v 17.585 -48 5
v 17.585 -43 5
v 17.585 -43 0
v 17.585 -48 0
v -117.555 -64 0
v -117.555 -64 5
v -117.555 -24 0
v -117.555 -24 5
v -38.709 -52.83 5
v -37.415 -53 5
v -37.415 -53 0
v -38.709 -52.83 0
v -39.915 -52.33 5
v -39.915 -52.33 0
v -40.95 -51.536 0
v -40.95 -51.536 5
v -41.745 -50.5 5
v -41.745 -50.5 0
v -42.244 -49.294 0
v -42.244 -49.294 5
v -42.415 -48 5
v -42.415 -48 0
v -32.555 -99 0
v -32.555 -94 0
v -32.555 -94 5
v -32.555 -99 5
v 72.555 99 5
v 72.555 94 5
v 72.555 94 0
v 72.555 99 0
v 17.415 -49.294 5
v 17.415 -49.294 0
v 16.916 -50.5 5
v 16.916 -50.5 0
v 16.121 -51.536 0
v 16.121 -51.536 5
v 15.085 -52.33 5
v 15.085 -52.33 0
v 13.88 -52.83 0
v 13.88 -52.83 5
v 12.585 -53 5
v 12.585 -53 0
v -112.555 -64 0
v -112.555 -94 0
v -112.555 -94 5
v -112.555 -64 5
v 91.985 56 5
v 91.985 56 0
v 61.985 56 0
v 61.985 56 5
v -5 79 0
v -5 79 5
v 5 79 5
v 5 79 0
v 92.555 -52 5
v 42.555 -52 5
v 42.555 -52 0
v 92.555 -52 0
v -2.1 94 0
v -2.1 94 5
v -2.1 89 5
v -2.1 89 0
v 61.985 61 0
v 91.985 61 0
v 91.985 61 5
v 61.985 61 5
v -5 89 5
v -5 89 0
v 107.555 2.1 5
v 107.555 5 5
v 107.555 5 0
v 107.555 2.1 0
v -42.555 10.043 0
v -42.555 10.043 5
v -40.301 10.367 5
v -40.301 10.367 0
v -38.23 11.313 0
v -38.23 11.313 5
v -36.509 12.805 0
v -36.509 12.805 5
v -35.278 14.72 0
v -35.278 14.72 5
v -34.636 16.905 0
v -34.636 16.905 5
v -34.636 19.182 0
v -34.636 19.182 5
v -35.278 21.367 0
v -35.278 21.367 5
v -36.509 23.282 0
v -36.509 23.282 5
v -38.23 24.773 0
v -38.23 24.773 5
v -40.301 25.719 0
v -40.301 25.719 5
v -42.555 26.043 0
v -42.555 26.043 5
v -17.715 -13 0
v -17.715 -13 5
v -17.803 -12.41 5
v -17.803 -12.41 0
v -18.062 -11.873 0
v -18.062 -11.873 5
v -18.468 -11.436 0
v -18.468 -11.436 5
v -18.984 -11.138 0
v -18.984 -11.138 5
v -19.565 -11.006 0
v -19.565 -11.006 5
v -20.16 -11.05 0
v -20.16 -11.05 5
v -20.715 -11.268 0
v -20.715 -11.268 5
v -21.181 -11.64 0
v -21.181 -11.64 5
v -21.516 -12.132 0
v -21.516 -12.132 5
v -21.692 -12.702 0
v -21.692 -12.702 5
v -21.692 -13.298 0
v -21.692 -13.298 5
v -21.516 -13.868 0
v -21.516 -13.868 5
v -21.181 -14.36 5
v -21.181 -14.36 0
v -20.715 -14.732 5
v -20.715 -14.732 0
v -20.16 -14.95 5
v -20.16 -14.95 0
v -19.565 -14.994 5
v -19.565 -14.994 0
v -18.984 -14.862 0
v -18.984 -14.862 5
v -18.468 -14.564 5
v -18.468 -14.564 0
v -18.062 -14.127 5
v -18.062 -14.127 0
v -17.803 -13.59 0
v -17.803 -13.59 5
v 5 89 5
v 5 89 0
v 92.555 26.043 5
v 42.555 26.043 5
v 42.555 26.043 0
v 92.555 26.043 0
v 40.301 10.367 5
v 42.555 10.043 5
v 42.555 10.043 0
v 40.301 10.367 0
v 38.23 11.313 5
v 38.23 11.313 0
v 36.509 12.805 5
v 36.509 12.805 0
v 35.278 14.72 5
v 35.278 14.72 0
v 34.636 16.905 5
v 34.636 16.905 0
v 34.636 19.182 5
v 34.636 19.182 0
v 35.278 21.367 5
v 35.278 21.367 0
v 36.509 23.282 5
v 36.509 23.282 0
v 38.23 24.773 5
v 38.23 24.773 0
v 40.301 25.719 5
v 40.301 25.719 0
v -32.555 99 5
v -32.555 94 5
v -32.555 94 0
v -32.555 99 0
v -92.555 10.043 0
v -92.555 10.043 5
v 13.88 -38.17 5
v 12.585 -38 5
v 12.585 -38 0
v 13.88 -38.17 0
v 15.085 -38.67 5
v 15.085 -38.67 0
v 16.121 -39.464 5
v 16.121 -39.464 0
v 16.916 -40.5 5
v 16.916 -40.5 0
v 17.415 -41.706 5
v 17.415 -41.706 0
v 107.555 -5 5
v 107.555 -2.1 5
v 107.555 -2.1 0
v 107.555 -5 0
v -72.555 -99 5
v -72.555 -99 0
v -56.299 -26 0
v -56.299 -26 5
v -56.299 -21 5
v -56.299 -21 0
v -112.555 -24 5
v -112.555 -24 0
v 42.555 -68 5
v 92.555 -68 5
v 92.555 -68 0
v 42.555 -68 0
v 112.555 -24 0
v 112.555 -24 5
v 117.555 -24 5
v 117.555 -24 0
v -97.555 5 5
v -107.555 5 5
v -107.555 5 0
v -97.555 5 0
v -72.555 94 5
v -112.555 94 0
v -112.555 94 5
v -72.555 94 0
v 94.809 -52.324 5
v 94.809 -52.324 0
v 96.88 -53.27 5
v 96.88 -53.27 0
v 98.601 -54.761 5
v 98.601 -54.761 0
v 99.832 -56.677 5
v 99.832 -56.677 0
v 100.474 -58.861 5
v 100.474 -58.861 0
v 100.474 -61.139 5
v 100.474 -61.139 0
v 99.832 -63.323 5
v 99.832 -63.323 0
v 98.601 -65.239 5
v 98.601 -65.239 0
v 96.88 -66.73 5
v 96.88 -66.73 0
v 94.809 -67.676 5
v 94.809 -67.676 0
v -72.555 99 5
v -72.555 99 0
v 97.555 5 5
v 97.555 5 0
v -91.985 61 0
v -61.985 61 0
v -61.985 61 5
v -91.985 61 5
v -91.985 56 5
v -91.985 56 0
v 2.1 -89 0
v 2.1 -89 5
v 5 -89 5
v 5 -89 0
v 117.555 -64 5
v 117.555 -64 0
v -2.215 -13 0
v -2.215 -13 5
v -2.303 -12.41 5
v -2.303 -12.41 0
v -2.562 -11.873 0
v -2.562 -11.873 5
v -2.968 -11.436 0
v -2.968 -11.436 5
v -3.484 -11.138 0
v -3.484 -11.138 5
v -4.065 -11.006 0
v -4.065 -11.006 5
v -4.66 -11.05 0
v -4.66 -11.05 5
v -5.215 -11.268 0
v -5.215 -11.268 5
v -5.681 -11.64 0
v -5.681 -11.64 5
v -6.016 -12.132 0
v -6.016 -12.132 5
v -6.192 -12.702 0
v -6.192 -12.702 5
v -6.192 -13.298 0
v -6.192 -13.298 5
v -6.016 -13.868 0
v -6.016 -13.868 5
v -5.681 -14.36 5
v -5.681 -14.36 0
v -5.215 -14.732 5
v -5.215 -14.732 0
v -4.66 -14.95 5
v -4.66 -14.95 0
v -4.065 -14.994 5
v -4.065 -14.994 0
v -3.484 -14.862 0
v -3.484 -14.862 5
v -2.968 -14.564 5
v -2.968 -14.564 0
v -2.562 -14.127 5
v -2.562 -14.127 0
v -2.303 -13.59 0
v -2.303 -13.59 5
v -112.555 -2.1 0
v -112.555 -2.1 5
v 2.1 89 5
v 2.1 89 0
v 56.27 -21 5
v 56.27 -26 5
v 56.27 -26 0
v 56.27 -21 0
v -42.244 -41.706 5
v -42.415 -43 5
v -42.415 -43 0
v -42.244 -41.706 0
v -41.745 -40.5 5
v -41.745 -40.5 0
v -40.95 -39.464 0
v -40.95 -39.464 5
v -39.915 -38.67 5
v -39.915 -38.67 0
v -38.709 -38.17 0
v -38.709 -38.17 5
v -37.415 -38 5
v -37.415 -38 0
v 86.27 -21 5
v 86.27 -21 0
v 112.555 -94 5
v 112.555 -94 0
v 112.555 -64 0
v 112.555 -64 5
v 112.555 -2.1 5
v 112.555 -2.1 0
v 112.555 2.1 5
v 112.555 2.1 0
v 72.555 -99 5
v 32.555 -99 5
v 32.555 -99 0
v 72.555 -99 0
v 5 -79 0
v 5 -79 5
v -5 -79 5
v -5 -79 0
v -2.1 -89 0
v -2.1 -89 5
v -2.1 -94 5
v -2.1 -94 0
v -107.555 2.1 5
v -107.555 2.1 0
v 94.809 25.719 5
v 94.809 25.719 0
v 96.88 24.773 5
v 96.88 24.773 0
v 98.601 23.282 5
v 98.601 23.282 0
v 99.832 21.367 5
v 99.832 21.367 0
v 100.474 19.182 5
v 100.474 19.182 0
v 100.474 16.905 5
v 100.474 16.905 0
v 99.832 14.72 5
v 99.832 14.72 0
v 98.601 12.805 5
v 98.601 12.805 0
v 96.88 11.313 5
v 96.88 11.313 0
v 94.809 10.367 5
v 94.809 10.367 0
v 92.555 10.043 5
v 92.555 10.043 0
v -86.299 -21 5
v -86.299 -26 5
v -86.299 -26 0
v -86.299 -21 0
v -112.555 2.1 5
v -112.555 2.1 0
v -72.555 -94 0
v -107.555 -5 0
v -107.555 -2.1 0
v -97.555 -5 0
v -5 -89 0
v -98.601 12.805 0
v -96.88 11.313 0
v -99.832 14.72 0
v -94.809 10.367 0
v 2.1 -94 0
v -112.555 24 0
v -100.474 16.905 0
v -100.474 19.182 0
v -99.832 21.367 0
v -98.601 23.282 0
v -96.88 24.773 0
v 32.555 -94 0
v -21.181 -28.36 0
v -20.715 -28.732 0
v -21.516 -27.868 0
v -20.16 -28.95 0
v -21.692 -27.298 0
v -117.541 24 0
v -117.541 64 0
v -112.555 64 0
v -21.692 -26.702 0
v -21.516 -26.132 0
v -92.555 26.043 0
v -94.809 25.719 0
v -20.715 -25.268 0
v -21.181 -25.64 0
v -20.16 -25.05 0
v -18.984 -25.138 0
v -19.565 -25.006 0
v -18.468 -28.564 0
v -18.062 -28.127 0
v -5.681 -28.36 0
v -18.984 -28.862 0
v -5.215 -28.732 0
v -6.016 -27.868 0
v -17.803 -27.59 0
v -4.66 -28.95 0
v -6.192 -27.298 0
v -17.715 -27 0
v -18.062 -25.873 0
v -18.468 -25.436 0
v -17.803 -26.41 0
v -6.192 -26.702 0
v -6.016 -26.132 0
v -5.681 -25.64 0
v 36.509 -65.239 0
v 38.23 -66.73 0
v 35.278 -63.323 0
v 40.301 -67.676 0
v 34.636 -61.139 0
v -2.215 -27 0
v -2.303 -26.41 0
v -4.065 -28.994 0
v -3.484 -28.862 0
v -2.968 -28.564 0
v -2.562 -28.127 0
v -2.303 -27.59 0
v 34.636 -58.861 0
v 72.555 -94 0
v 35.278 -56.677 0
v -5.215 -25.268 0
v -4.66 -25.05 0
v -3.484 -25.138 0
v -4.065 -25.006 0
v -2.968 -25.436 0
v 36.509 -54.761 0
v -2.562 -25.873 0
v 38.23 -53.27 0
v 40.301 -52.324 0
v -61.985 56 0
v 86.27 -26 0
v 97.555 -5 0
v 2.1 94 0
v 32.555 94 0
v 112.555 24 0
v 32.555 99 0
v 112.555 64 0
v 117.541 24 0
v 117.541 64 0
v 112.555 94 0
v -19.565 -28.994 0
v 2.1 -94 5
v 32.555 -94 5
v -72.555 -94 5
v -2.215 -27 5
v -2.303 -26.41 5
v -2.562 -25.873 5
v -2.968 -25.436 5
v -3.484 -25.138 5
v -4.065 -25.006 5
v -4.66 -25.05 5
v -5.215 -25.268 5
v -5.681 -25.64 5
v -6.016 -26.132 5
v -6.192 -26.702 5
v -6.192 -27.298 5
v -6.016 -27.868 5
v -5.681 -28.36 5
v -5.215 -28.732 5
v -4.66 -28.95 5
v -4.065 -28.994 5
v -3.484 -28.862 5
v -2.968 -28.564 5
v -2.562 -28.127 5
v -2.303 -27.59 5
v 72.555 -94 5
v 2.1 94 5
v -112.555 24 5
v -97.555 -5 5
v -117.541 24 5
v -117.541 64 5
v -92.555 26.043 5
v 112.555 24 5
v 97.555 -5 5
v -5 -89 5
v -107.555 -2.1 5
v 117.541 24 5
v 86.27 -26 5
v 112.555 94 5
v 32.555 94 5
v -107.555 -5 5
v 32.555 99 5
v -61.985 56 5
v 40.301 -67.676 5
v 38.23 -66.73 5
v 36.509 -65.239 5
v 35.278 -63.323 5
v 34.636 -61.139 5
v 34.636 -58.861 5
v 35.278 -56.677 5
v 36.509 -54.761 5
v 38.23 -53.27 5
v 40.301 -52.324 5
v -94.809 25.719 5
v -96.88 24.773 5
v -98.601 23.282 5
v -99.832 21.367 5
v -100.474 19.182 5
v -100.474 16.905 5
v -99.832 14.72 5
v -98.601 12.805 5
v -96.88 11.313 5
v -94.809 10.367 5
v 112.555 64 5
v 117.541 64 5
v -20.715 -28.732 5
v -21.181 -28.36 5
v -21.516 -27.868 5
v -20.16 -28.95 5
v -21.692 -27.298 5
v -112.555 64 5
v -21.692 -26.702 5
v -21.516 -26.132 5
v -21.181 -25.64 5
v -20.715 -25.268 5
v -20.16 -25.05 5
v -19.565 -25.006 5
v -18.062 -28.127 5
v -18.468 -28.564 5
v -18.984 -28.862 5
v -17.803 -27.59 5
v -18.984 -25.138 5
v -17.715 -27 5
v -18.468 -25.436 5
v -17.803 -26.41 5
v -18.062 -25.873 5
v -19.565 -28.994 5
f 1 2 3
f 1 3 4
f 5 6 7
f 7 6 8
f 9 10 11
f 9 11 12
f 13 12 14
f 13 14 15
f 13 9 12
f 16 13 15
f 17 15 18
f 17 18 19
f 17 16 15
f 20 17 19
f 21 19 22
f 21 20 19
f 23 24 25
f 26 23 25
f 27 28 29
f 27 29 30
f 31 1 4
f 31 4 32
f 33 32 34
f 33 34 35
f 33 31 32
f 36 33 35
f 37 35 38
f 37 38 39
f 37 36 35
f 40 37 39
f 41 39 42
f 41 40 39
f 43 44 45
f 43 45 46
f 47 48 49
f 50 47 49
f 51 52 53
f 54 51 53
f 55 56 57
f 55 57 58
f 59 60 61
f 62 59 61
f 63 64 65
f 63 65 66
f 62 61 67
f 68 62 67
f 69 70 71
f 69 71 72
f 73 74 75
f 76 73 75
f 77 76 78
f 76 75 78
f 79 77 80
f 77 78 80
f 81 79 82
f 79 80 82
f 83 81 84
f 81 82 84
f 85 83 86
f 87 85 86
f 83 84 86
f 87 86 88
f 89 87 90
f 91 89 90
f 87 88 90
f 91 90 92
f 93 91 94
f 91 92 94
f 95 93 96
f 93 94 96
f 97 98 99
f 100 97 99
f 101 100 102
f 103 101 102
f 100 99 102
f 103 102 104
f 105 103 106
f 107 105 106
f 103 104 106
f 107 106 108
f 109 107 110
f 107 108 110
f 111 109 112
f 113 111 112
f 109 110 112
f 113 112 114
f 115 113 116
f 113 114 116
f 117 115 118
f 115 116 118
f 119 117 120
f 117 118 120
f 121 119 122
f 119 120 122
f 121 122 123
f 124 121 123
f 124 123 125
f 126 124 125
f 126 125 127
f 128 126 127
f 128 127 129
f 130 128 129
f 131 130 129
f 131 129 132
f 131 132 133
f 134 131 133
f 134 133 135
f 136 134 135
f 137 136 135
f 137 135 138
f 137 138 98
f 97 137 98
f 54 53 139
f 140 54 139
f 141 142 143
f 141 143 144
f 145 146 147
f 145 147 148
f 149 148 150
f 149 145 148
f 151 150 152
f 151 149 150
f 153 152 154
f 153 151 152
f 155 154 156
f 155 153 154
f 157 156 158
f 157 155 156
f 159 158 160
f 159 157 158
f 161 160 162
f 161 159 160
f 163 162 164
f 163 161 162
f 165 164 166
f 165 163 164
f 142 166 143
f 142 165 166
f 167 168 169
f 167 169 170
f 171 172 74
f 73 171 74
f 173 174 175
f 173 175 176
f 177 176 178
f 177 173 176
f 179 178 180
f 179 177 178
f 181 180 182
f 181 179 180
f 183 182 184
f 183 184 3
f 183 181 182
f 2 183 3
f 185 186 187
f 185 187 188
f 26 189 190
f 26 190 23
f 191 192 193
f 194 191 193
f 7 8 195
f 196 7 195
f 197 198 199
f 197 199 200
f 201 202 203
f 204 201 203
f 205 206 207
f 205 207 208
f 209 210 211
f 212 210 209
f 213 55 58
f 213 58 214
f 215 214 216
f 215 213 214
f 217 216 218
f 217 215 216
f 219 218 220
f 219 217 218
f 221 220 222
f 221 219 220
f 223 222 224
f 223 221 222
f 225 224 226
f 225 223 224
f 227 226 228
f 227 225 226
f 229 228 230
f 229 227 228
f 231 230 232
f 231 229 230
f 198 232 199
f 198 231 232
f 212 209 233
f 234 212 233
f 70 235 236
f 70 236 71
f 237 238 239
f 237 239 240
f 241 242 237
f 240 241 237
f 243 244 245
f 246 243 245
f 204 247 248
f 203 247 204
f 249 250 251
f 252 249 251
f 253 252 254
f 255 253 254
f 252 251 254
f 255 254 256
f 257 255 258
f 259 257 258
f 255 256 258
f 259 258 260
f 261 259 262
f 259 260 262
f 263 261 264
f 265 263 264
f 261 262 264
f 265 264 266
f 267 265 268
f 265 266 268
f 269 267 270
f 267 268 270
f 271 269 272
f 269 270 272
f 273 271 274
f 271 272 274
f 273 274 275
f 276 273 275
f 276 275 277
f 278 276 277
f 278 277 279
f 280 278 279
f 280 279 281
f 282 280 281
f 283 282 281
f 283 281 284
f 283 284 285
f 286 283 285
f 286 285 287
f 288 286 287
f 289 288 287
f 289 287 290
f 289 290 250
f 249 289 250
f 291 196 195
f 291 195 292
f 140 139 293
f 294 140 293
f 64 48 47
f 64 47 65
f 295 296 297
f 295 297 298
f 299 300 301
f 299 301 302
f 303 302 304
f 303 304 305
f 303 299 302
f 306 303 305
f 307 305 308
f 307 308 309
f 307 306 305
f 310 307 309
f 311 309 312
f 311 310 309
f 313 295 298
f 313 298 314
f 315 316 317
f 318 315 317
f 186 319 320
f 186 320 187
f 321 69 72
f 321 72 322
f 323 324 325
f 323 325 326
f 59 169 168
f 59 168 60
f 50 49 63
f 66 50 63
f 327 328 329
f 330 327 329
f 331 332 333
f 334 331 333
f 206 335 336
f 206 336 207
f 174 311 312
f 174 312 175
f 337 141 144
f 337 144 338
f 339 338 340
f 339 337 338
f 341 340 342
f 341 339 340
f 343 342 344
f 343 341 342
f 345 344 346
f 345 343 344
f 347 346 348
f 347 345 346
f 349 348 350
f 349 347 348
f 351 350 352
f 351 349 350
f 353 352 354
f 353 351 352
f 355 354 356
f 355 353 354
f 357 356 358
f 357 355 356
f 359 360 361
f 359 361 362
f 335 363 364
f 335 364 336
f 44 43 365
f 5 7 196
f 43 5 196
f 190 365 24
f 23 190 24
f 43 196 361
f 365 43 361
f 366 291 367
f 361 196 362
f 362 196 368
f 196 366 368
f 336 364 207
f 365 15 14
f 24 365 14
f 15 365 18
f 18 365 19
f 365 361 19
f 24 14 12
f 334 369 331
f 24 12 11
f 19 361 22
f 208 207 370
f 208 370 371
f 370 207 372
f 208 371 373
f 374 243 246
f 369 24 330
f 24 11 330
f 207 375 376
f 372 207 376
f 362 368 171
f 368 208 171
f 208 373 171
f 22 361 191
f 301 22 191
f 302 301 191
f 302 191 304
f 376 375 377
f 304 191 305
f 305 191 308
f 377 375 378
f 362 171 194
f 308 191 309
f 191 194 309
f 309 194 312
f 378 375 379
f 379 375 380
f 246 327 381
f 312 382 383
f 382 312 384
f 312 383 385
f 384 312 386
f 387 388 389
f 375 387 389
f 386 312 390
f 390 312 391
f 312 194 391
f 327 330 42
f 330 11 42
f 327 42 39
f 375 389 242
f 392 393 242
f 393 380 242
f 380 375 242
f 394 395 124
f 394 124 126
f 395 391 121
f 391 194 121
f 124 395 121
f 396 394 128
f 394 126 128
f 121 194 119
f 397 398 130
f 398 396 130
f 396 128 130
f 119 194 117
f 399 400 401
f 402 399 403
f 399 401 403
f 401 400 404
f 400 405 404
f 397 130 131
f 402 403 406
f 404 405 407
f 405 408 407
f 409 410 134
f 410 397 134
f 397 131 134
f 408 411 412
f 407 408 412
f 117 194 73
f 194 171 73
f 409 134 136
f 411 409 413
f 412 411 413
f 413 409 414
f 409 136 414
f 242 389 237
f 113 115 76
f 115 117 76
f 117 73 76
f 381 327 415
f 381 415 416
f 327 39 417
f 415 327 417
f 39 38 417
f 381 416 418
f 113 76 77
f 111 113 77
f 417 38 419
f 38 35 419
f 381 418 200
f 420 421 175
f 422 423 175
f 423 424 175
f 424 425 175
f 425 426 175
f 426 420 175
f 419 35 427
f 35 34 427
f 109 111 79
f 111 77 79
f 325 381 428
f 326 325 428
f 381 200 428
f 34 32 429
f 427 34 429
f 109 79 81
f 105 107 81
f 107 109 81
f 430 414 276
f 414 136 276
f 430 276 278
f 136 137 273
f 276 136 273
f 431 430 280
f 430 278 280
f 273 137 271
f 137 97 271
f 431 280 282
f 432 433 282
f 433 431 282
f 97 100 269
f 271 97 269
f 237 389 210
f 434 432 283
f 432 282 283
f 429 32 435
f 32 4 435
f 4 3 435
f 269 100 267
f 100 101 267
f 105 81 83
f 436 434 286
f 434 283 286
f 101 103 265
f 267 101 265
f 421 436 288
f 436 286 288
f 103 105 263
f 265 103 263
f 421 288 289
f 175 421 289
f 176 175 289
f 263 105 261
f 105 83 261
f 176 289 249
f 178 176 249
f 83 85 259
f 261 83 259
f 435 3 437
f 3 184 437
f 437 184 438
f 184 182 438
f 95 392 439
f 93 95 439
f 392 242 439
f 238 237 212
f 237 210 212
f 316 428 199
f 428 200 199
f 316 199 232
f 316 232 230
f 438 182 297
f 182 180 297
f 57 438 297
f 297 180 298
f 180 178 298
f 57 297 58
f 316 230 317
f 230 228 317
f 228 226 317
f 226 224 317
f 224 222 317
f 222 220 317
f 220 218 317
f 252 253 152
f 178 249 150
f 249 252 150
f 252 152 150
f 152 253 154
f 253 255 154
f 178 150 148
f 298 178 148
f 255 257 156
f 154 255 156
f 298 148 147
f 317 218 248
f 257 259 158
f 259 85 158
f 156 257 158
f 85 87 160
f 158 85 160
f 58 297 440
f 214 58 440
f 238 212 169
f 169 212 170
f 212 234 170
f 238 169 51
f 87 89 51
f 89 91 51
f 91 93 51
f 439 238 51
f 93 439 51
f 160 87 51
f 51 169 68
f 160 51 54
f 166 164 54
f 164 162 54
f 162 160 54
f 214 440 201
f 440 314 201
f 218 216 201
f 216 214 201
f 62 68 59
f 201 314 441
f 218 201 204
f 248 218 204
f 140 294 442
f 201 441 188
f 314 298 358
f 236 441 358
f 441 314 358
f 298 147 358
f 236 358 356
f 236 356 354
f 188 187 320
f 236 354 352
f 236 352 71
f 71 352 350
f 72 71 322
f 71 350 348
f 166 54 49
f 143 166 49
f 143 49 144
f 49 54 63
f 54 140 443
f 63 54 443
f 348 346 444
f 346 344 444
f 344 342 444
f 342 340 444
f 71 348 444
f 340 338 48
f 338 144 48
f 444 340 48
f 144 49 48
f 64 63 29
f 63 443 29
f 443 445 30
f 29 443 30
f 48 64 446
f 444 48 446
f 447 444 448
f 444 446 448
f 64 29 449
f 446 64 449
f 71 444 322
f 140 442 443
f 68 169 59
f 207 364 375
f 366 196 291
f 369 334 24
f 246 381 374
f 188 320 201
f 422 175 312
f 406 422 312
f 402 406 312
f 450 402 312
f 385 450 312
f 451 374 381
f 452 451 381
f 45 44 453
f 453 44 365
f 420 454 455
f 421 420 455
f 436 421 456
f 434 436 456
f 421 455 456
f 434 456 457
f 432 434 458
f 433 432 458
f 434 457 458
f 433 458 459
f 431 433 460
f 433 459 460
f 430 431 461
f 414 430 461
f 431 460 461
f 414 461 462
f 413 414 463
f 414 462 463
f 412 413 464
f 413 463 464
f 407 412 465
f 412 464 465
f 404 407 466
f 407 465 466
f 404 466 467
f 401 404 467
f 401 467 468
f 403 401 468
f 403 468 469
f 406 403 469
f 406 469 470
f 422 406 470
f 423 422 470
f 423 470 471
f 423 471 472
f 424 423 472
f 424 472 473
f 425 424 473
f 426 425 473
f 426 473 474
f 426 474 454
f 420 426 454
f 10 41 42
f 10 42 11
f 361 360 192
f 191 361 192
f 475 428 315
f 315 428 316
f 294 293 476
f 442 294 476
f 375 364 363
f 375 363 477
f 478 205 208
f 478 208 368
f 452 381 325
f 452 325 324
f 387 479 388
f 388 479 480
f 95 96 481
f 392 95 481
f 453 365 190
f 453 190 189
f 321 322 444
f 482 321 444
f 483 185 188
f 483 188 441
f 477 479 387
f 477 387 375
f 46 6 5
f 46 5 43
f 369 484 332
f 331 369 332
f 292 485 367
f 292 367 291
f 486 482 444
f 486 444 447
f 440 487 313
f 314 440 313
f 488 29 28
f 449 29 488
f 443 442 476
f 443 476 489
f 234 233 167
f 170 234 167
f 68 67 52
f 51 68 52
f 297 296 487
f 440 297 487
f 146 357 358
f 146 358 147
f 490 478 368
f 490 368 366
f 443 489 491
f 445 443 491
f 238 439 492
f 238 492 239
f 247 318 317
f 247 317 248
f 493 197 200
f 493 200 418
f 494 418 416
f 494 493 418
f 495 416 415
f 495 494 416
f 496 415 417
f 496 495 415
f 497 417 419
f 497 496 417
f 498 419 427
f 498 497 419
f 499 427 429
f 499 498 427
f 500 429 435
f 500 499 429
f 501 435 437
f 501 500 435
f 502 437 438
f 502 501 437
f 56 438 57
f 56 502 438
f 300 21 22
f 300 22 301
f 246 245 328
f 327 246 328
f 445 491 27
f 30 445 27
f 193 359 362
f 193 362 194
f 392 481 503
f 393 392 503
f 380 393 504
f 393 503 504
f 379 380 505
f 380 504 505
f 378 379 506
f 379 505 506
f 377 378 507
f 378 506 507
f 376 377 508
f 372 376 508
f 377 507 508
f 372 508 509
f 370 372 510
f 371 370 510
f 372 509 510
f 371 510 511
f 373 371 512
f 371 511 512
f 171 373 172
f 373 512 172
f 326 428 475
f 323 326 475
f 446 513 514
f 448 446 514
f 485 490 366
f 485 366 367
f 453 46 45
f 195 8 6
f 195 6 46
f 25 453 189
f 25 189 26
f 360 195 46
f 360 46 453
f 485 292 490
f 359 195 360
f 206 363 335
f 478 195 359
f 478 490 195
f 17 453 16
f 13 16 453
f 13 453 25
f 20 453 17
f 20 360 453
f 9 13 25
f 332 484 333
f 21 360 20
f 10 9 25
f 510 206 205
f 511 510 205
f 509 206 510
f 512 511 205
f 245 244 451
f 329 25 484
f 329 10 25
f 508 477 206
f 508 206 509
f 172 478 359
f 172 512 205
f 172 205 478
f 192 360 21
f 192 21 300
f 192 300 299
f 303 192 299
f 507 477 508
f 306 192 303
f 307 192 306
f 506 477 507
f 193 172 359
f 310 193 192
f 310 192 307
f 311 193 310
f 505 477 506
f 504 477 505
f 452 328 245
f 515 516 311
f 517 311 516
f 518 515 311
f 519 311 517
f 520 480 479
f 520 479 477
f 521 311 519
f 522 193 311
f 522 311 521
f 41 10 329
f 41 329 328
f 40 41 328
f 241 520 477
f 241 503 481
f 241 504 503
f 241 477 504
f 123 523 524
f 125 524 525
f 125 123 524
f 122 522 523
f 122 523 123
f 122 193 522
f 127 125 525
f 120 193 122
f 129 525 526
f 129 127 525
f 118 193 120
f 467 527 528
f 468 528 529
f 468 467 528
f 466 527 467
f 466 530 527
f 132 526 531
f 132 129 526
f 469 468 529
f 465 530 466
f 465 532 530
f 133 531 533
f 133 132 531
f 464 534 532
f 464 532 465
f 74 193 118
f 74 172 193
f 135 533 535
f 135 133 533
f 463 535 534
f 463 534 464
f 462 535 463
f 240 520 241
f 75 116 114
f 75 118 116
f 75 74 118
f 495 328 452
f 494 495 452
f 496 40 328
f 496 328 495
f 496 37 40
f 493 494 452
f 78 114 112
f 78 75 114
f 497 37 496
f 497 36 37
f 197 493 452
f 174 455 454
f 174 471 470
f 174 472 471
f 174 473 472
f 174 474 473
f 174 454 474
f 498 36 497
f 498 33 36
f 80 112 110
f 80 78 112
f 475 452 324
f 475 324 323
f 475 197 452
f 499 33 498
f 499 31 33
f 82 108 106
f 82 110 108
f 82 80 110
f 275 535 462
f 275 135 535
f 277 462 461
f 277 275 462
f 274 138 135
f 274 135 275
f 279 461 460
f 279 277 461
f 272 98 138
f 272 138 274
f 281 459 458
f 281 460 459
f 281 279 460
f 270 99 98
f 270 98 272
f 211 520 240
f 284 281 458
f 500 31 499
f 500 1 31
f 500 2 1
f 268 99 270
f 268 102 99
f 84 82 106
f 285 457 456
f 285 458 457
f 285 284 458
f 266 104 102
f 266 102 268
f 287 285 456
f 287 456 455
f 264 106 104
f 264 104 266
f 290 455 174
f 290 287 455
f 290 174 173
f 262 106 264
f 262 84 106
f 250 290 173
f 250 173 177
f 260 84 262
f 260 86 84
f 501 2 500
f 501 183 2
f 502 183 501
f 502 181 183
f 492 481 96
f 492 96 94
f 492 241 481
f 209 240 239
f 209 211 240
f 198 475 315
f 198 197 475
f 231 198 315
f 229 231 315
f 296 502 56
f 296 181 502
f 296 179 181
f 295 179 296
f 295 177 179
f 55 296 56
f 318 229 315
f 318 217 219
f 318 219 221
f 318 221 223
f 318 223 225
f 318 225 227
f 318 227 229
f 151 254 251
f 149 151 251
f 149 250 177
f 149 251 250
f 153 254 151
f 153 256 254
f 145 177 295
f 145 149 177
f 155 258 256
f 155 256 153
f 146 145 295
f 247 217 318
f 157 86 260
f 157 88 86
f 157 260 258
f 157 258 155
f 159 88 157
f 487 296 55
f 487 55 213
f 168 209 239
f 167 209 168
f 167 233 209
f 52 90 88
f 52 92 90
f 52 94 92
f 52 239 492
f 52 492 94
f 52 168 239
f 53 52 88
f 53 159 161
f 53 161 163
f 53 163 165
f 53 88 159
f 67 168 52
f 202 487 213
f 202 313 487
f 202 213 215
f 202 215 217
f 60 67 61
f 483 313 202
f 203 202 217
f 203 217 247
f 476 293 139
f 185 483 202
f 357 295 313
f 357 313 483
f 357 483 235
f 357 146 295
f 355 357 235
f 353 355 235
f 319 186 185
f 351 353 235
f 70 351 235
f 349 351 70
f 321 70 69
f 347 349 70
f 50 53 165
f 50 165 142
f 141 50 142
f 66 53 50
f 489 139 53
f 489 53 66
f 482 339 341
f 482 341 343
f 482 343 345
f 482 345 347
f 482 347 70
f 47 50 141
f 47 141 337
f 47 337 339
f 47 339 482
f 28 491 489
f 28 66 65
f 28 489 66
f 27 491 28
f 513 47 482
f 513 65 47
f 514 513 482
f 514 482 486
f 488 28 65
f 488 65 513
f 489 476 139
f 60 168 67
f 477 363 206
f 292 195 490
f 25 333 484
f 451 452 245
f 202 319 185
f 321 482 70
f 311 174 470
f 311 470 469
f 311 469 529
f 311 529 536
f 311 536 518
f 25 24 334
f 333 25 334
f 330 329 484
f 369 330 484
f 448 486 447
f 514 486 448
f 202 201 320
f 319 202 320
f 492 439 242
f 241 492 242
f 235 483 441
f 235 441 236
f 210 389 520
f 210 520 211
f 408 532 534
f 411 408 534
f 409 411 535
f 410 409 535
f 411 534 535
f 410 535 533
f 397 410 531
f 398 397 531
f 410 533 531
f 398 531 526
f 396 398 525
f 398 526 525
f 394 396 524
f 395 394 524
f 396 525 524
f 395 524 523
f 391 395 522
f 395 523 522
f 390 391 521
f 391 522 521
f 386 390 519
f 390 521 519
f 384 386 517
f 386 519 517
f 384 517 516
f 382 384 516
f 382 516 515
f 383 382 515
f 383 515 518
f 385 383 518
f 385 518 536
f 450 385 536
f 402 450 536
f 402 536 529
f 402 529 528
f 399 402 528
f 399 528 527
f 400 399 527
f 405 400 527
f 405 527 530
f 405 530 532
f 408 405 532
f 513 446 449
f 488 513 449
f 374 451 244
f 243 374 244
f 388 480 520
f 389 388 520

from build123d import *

# Parameters (mm, degrees)
SKETCH1_W           = 225.11
SKETCH1_H           = 188
BOSS_EXTRUDE1_DEPTH = 5
SKETCH2_R           = 2
CUT_EXTRUDE1_DEPTH  = 10
SKETCH3_W           = 40
SKETCH3_H           = 5
BOSS_EXTRUDE2_DEPTH = 5
SKETCH5_W           = 5
SKETCH5_H           = 40
SKETCH5_W_2         = 40
SKETCH5_H_2         = 5
BOSS_EXTRUDE3_DEPTH = 5
CUT_EXTRUDE2_DEPTH  = 5
CUT_EXTRUDE3_DEPTH  = 5
SKETCH8_W           = 30
SKETCH8_H           = 5
CUT_EXTRUDE4_DEPTH  = 5
SKETCH9_W           = 30.000010782
SKETCH9_H           = 5
CUT_EXTRUDE5_DEPTH  = 5
CUT_EXTRUDE6_DEPTH  = 15
BOSS_EXTRUDE4_DEPTH = 5


with BuildPart() as part:
    # Sketch1 → Boss-Extrude1 (new body)
    with BuildSketch(Plane.XY):
        Rectangle(SKETCH1_W, SKETCH1_H)
    extrude(amount=BOSS_EXTRUDE1_DEPTH)

    # Sketch2 → Cut-Extrude1 (cut)
    with BuildSketch(Plane.XY.offset(5)):
        with Locations((-19.714505863, -13)):
            Circle(SKETCH2_R)
        with Locations((-4.214505863, -13)):
            Circle(SKETCH2_R)
        with Locations((-4.214505863, -27)):
            Circle(SKETCH2_R)
        with Locations((-19.714505863, -27)):
            Circle(SKETCH2_R)
    extrude(amount=-CUT_EXTRUDE1_DEPTH, mode=Mode.SUBTRACT)

    # Sketch3 → Boss-Extrude2 (add)
    with BuildSketch(Plane.XZ.offset(94)):
        with Locations((-52.555, 2.5)):
            Rectangle(SKETCH3_W, SKETCH3_H)
        with Locations((52.555, 2.5)):
            Rectangle(SKETCH3_W, SKETCH3_H)
    extrude(amount=BOSS_EXTRUDE2_DEPTH)

    # Sketch5 → Boss-Extrude3 (add)
    with BuildSketch(Plane.XY.offset(5)):
        with Locations((115.055, -44)):
            Rectangle(SKETCH5_W, SKETCH5_H)
        with Locations((115.041030137, 44)):
            Rectangle(SKETCH5_W, SKETCH5_H)
        with Locations((52.555, 96.5)):
            Rectangle(SKETCH5_W_2, SKETCH5_H_2)
        with Locations((-52.555, 96.5)):
            Rectangle(SKETCH5_W_2, SKETCH5_H_2)
        with Locations((-115.041030137, 44)):
            Rectangle(SKETCH5_W, SKETCH5_H)
        with Locations((-115.055, -44)):
            Rectangle(SKETCH5_W, SKETCH5_H)
    extrude(amount=-BOSS_EXTRUDE3_DEPTH)

    # Sketch6 → Cut-Extrude2 (cut)
    with BuildSketch(Plane.XY.offset(5)):
        Polygon((112.555, -2.1), (107.555, -2.1), (107.555, -5), (97.555, -5), (97.555, 5), (107.555, 5), (107.555, 2.1), (112.555, 2.1), align=None)
        Polygon((2.1, -94), (2.1, -89), (5, -89), (5, -79), (-5, -79), (-5, -89), (-2.1, -89), (-2.1, -94), align=None)
        Polygon((-2.1, 94), (-2.1, 89), (-5, 89), (-5, 79), (5, 79), (5, 89), (2.1, 89), (2.1, 94), align=None)
        Polygon((-112.555, 2.1), (-107.555, 2.1), (-107.555, 5), (-97.555, 5), (-97.555, -5), (-107.555, -5), (-107.555, -2.1), (-112.555, -2.1), align=None)
    extrude(amount=-CUT_EXTRUDE2_DEPTH, mode=Mode.SUBTRACT)

    # Sketch7 → Cut-Extrude3 (cut)
    with BuildSketch(Plane.XY.offset(5)):
        with BuildLine():
            Line((12.585494137, -53), (-37.414505863, -53))
            ThreePointArc((-37.414505863, -53), (-40.950039769, -51.535533906), (-42.414505863, -48))
            Line((-42.414505863, -48), (-42.414505863, -43))
            ThreePointArc((-42.414505863, -43), (-40.950039769, -39.464466094), (-37.414505863, -38))
            Line((-37.414505863, -38), (12.585494137, -38))
            ThreePointArc((12.585494137, -38), (16.121028043, -39.464466094), (17.585494137, -43))
            Line((17.585494137, -43), (17.585494137, -48))
            ThreePointArc((17.585494137, -48), (16.121028043, -51.535533906), (12.585494137, -53))
        make_face()
    extrude(amount=-CUT_EXTRUDE3_DEPTH, mode=Mode.SUBTRACT)

    # Sketch8 → Cut-Extrude4 (cut)
    with BuildSketch(Plane.XY.offset(5)):
        with Locations((71.270247069, -23.5)):
            Rectangle(SKETCH8_W, SKETCH8_H)
        with Locations((-71.299246748, -23.5)):
            Rectangle(SKETCH8_W, SKETCH8_H)
    extrude(amount=-CUT_EXTRUDE4_DEPTH, mode=Mode.SUBTRACT)

    # Sketch9 → Cut-Extrude5 (cut)
    with BuildSketch(Plane(origin=(0, 0, 0), x_dir=(-1, 0, 0), z_dir=(0, 0, -1))):
        with Locations((76.984802428, 58.5)):
            Rectangle(SKETCH9_W, SKETCH9_H)
        with Locations((-76.984802428, 58.5)):
            Rectangle(SKETCH9_W, SKETCH9_H)
    extrude(amount=-CUT_EXTRUDE5_DEPTH, mode=Mode.SUBTRACT)

    # Sketch10 → Cut-Extrude6 (cut)
    with BuildSketch(Plane.XY.offset(5)):
        with BuildLine():
            Line((92.555, -68), (42.555, -68))
            ThreePointArc((42.555, -68), (34.555, -60), (42.555, -52))
            Line((42.555, -52), (92.555, -52))
            ThreePointArc((92.555, -52), (100.555, -60), (92.555, -68))
        make_face()
        with BuildLine():
            Line((92.555, 10.043404022), (42.555, 10.043404022))
            ThreePointArc((42.555, 10.043404022), (34.555, 18.043404022), (42.555, 26.043404022))
            Line((42.555, 26.043404022), (92.555, 26.043404022))
            ThreePointArc((92.555, 26.043404022), (100.555, 18.043404022), (92.555, 10.043404022))
        make_face()
        with BuildLine():
            Line((-92.555, 10.043404022), (-42.555, 10.043404022))
            ThreePointArc((-42.555, 10.043404022), (-34.555, 18.043404022), (-42.555, 26.043404022))
            Line((-42.555, 26.043404022), (-92.555, 26.043404022))
            ThreePointArc((-92.555, 26.043404022), (-100.555, 18.043404022), (-92.555, 10.043404022))
        make_face()
        with BuildLine():
            Line((-92.555, -68), (-42.555, -68))
            ThreePointArc((-42.555, -68), (-34.555, -60), (-42.555, -52))
            Line((-42.555, -52), (-92.555, -52))
            ThreePointArc((-92.555, -52), (-100.555, -60), (-92.555, -68))
        make_face()
    extrude(amount=-CUT_EXTRUDE6_DEPTH, mode=Mode.SUBTRACT)

    # Sketch11 → Boss-Extrude4 (add)
    with BuildSketch(Plane.XY.offset(5)):
        with BuildLine():
            Line((-92.555, -68), (-42.555, -68))
            ThreePointArc((-42.555, -68), (-34.555, -60), (-42.555, -52))
            Line((-42.555, -52), (-92.555, -52))
            ThreePointArc((-92.555, -52), (-100.555, -60), (-92.555, -68))
        make_face()
    extrude(amount=-BOSS_EXTRUDE4_DEPTH)


solid = part.part
